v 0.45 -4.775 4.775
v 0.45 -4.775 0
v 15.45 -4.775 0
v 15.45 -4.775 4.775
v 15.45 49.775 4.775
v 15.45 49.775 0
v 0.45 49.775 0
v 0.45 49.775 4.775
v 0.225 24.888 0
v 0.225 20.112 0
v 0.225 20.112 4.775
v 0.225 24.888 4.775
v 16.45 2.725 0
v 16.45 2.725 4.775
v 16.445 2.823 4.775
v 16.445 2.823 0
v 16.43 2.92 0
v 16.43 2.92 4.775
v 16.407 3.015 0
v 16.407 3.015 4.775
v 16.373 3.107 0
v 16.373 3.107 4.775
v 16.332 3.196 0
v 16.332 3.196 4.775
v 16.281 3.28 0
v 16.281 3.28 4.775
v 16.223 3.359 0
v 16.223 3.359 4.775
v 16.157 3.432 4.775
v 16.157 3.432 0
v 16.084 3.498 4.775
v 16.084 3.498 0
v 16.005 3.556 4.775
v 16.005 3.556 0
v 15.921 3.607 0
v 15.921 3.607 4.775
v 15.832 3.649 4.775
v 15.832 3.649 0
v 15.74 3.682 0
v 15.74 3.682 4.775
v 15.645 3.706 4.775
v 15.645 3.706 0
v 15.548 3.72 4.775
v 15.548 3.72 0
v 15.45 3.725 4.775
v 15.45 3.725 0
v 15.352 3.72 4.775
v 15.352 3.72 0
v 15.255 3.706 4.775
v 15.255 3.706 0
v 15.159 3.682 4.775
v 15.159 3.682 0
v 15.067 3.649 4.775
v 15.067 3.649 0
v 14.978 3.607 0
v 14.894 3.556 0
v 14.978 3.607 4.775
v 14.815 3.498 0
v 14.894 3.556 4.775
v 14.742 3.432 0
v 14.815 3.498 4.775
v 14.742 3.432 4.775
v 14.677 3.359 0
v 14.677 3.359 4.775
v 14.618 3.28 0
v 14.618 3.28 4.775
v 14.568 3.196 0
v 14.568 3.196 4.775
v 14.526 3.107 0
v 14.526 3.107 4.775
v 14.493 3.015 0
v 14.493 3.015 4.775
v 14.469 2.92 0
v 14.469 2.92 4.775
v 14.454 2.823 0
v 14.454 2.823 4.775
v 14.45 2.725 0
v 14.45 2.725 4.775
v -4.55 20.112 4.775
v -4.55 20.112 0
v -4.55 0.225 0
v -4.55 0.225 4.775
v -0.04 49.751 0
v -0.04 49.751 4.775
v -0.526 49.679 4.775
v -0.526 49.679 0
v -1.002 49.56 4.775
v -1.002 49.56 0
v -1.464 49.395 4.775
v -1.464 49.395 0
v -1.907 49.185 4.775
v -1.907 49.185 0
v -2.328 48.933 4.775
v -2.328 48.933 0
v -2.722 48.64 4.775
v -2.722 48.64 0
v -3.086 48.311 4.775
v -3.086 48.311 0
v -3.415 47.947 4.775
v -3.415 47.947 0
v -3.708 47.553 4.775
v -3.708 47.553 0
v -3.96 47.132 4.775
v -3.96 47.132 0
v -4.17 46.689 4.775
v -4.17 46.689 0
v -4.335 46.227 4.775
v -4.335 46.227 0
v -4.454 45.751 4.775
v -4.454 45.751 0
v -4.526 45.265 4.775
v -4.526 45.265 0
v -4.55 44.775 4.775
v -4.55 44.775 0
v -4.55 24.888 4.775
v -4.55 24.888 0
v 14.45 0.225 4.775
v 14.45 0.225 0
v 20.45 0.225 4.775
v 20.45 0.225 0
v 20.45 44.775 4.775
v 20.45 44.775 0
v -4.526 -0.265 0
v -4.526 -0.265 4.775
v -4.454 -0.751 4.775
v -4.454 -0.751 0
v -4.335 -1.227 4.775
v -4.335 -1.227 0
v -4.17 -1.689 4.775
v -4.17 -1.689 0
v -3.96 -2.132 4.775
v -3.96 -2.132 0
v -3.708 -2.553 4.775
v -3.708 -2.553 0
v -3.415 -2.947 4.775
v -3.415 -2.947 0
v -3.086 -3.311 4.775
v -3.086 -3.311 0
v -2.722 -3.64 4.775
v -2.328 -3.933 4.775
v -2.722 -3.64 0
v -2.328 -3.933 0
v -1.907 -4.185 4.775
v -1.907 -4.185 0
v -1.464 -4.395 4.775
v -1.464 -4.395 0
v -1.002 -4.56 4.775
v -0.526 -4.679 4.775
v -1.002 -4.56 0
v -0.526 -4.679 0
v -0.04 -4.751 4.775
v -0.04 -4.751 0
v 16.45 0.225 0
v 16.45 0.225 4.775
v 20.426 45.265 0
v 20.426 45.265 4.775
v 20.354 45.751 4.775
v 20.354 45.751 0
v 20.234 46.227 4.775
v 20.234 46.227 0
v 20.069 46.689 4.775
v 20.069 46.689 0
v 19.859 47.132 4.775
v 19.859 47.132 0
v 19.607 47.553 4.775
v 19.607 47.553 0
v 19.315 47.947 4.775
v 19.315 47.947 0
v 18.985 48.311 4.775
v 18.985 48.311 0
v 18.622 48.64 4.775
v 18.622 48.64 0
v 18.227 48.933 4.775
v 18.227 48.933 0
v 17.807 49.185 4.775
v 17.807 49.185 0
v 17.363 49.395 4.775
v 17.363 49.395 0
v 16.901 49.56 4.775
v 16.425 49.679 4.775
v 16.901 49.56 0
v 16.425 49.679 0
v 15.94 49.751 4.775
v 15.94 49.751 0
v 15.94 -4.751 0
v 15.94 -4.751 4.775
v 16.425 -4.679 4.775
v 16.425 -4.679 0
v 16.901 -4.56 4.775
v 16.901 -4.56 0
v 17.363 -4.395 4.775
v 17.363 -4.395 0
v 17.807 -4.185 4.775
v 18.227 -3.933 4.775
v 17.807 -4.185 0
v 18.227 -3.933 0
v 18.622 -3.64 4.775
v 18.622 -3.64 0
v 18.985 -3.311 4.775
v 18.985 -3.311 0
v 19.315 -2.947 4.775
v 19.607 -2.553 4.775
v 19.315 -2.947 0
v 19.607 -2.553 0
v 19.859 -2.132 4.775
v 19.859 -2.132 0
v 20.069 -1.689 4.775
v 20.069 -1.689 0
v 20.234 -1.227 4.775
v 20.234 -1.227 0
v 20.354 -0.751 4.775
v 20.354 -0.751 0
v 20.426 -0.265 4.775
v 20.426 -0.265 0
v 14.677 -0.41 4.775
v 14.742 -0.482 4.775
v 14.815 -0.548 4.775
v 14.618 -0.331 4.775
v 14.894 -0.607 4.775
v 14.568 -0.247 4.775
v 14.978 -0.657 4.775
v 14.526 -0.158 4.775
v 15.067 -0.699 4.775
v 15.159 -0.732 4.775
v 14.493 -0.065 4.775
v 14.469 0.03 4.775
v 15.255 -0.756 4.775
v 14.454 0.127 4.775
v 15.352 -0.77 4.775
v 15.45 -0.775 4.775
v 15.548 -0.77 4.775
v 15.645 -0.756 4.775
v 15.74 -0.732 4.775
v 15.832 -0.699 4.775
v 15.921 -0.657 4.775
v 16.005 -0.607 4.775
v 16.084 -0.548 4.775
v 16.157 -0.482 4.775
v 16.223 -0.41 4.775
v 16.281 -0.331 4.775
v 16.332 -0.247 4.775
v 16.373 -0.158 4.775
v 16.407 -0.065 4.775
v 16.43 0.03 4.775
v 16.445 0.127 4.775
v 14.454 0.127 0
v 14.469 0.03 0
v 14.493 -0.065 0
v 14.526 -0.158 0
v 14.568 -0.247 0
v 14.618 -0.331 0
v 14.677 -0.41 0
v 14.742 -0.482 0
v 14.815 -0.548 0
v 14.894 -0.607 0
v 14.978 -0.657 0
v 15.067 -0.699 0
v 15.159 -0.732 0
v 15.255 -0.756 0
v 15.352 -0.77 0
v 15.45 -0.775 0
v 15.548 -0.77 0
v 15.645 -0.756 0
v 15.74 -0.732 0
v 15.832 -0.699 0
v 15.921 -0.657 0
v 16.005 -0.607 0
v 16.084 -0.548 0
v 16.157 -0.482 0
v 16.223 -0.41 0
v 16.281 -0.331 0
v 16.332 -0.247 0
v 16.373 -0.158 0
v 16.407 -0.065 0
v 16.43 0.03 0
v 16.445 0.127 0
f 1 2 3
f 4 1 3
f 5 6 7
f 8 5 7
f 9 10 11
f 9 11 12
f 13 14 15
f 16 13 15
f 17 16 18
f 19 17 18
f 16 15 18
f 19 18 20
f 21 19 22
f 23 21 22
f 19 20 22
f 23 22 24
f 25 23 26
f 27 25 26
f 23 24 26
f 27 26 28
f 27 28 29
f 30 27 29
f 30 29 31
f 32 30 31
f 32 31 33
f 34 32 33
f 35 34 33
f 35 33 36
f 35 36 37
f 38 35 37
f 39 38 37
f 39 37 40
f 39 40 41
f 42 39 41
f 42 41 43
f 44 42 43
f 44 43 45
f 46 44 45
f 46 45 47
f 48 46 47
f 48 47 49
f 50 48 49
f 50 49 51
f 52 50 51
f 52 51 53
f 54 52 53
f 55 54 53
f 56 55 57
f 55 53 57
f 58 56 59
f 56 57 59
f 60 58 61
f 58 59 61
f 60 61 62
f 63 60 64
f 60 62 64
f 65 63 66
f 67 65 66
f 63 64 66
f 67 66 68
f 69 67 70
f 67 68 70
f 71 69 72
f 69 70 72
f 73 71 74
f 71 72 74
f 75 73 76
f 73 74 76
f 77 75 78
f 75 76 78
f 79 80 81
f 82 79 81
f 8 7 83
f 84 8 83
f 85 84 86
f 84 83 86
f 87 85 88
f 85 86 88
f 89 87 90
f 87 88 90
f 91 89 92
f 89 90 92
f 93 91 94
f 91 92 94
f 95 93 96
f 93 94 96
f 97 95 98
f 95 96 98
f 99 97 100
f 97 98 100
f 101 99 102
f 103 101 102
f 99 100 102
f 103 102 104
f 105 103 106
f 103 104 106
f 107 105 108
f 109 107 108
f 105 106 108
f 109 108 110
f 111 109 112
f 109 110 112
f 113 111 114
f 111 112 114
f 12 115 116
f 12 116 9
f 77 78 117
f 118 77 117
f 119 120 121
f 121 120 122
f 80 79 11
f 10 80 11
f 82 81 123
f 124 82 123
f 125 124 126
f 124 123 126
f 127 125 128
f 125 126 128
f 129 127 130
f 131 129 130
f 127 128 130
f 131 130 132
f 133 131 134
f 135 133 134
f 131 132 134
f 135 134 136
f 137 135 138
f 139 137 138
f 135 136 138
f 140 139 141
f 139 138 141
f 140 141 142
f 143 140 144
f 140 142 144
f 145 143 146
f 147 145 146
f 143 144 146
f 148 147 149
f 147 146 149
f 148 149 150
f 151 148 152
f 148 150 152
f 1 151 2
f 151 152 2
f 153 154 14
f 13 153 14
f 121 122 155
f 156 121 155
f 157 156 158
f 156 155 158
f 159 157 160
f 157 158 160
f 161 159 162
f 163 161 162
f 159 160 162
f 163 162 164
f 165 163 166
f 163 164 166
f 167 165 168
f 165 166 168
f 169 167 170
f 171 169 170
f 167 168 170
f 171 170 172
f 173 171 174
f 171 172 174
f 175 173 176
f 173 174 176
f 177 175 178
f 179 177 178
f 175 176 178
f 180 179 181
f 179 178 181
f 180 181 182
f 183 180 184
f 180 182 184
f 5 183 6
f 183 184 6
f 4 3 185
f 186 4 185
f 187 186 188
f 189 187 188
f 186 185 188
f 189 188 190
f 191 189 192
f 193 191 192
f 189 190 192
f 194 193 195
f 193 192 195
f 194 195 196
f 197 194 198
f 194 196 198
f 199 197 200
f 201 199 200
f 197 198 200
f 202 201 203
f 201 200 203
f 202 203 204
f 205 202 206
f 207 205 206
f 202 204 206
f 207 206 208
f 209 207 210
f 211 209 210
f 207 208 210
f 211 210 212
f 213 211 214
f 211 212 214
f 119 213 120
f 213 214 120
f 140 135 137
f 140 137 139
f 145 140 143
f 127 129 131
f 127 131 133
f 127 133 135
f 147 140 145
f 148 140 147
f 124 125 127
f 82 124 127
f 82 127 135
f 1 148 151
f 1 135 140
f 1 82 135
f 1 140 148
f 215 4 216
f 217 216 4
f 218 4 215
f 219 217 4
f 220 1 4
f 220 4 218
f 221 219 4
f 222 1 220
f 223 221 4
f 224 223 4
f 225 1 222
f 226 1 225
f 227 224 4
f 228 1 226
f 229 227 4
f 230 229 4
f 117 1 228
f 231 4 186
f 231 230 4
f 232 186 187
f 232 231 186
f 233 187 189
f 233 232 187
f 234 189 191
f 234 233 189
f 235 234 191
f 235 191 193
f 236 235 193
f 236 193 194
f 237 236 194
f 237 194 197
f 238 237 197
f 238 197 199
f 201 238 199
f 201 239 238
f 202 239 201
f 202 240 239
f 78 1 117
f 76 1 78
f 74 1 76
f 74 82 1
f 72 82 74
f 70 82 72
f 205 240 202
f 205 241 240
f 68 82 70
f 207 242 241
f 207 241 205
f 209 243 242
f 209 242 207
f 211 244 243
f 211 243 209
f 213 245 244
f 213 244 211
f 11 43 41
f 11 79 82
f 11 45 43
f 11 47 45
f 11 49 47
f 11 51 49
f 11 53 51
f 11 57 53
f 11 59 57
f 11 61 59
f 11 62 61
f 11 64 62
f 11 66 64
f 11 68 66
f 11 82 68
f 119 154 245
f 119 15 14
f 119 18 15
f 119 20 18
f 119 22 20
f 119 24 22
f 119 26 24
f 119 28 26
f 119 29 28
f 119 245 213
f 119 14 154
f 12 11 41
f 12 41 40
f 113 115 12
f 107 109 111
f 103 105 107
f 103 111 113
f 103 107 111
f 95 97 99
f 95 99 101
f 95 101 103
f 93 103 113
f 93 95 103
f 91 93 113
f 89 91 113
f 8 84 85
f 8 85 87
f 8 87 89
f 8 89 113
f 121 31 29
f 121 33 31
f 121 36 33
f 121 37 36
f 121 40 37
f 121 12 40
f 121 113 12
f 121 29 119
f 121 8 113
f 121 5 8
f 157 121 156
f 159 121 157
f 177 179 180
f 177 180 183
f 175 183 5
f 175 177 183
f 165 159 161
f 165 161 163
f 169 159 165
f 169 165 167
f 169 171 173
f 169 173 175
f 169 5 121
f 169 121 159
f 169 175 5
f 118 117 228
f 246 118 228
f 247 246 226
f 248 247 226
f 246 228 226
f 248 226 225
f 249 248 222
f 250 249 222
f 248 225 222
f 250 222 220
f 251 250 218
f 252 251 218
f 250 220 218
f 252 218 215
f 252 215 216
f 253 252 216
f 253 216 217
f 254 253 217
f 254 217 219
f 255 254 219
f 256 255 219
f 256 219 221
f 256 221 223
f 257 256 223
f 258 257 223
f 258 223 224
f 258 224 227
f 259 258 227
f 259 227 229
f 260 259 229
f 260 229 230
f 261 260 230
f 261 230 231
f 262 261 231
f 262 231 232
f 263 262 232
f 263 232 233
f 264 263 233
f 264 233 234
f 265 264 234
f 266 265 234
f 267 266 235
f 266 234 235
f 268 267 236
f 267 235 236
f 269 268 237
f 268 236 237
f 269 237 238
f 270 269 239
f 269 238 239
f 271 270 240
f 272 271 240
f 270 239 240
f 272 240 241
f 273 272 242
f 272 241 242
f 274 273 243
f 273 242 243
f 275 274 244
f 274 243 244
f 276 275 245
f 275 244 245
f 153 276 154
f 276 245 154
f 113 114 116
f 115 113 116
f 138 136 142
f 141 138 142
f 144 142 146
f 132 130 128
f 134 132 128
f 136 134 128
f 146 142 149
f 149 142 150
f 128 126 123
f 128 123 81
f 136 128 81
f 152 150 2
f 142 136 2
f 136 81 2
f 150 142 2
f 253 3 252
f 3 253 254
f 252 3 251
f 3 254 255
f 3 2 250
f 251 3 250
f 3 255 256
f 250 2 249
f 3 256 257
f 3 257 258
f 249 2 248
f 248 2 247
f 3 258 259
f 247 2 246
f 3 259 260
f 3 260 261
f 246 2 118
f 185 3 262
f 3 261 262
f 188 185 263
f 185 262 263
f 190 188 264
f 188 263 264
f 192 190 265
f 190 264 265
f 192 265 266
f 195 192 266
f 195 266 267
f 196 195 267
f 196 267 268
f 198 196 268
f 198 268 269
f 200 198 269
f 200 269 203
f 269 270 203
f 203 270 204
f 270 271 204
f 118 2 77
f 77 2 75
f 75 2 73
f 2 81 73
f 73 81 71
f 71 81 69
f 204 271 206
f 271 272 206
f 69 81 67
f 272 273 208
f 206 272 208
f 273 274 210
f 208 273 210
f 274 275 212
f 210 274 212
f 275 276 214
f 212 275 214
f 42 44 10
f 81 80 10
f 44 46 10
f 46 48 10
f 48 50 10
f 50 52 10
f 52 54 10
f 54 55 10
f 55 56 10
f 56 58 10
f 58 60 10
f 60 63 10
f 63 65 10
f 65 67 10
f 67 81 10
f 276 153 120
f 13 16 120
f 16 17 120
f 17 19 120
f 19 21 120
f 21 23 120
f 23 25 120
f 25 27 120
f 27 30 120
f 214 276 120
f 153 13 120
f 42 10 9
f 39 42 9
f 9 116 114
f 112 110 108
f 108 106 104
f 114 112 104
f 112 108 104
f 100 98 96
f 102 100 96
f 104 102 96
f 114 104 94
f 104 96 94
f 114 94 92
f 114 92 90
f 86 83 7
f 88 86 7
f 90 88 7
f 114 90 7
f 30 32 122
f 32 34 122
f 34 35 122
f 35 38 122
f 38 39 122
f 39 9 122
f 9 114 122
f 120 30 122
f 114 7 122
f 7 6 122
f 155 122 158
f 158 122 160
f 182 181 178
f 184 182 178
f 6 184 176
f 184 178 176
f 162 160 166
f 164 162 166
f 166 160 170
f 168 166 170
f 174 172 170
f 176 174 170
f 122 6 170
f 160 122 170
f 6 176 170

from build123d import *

# Parameters (mm, degrees)
BOSS_EXTRUDE1_DEPTH = 4.7752
SKETCH4_W           = 4.7752
SKETCH4_H           = 4.7752
CUT_EXTRUDE1_DEPTH  = 5.7752
CUT_EXTRUDE2_DEPTH  = 10


with BuildPart() as part:
    # Sketch1 → Boss-Extrude1 (new body)
    with BuildSketch(Plane.XY):
        with BuildLine():
            Line((-4.5504, 44.7752), (-4.5504, 0.2248))
            ThreePointArc((-4.5504, 0.2248), (-3.085933906, -3.310733906), (0.4496, -4.7752))
            Line((0.4496, -4.7752), (15.4496, -4.7752))
            ThreePointArc((15.4496, -4.7752), (18.985133906, -3.310733906), (20.4496, 0.2248))
            Line((20.4496, 0.2248), (20.4496, 44.7752))
            ThreePointArc((20.4496, 44.7752), (18.985133906, 48.310733906), (15.4496, 49.7752))
            Line((15.4496, 49.7752), (0.4496, 49.7752))
            ThreePointArc((0.4496, 49.7752), (-3.085933906, 48.310733906), (-4.5504, 44.7752))
        make_face()
    extrude(amount=BOSS_EXTRUDE1_DEPTH)

    # Sketch4 → Cut-Extrude1 (cut, through all)
    with BuildSketch(Plane.XY.offset(4.7752)):
        with Locations((-2.1628, 22.5)):
            Rectangle(SKETCH4_W, SKETCH4_H)
    extrude(amount=-CUT_EXTRUDE1_DEPTH, mode=Mode.SUBTRACT)

    # Sketch5 → Cut-Extrude2 (cut)
    with BuildSketch(Plane.XY.offset(4.7752)):
        with BuildLine():
            Line((16.4496, 0.2248), (16.4496, 2.7248))
            ThreePointArc((16.4496, 2.7248), (15.4496, 3.7248), (14.4496, 2.7248))
            Line((14.4496, 2.7248), (14.4496, 0.2248))
            ThreePointArc((14.4496, 0.2248), (15.4496, -0.7752), (16.4496, 0.2248))
        make_face()
    extrude(amount=-CUT_EXTRUDE2_DEPTH, mode=Mode.SUBTRACT)


solid = part.part
